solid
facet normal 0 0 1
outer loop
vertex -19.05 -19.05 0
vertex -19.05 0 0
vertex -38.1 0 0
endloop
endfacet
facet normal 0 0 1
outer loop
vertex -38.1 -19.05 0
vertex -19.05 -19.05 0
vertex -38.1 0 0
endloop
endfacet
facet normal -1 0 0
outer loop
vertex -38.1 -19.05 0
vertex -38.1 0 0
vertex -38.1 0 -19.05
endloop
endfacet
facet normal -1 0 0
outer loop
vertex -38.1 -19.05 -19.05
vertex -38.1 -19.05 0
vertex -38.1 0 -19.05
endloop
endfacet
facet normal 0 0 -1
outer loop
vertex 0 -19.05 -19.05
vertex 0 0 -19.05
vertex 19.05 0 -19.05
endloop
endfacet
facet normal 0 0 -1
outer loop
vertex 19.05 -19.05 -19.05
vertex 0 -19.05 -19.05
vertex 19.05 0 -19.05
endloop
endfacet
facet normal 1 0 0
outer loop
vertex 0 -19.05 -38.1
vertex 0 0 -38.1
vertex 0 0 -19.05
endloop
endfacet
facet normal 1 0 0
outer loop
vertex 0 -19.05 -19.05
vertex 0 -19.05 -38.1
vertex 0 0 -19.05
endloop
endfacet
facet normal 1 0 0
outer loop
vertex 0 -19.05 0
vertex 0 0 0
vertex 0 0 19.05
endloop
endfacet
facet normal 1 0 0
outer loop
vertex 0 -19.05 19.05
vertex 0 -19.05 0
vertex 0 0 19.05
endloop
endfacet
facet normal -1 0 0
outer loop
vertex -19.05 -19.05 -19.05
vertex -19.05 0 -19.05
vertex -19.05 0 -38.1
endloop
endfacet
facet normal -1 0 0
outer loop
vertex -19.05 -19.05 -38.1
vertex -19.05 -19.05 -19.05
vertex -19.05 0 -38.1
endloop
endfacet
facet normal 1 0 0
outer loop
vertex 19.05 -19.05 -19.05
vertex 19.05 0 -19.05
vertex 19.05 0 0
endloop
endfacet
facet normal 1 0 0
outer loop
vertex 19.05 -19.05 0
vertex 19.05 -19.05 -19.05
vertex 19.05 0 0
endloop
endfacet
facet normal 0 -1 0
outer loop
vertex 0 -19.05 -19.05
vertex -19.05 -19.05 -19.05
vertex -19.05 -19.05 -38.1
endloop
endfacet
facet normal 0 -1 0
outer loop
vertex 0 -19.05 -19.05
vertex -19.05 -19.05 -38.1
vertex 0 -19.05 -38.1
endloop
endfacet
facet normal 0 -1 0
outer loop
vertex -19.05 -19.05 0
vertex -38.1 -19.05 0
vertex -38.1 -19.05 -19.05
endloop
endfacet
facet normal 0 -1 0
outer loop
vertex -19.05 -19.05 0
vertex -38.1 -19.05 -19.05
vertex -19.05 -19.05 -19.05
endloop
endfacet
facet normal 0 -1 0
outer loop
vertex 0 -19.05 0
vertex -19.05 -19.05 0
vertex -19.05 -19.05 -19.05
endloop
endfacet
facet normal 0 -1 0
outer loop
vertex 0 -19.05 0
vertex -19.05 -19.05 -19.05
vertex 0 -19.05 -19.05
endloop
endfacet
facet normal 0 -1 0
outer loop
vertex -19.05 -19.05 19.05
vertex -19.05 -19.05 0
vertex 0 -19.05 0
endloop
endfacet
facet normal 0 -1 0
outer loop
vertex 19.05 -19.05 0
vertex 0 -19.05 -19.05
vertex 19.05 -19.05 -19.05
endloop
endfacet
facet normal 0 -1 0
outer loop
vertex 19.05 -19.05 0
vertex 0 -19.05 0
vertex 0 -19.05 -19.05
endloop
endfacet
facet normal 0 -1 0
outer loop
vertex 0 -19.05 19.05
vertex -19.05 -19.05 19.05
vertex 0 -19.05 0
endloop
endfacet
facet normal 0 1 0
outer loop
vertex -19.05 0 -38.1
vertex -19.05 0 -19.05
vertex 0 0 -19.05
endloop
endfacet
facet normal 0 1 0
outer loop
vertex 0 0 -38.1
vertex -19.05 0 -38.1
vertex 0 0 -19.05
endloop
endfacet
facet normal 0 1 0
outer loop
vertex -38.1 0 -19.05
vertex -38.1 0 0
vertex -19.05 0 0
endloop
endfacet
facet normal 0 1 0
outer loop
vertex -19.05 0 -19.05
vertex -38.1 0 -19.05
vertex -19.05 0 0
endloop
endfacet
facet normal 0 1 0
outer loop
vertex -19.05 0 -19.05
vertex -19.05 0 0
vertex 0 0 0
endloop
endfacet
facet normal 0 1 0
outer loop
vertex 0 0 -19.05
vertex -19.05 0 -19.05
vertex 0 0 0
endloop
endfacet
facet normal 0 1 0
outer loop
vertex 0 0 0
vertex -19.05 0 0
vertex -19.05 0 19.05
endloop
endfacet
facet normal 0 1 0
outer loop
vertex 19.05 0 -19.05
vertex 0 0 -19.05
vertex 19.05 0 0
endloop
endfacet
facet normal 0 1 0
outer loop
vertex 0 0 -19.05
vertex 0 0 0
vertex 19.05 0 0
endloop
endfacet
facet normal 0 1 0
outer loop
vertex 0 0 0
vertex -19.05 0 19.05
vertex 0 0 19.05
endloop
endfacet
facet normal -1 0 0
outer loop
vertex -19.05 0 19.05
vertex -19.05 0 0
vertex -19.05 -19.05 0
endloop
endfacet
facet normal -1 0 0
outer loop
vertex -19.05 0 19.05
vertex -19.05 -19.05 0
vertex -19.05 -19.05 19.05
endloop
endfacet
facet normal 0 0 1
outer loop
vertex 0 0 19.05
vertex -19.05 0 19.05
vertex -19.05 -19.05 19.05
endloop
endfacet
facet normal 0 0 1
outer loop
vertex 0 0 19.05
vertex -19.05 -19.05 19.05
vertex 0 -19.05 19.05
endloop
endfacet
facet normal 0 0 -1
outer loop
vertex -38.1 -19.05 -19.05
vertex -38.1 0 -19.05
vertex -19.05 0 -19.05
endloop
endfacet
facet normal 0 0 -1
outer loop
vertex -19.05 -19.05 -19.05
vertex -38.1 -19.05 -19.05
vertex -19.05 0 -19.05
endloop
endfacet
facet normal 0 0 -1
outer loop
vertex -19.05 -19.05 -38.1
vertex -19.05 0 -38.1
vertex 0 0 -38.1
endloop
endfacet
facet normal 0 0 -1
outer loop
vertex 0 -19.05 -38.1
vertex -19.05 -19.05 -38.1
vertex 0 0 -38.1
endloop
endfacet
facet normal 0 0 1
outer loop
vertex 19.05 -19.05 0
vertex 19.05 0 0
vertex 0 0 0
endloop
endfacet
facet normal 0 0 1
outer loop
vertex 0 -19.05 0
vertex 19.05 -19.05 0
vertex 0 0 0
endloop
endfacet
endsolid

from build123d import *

# Parameters (mm, degrees)
F0_W     = 19.05
F0_H     = 19.05
F1_DEPTH = 19.05


with BuildPart() as f1:
    # F0 (on Front) → F1 (new body)
    with BuildSketch(Plane.XZ):
        with Locations((-9.525, 9.525)):
            Rectangle(F0_W, F0_H)
        Polygon((0, 0), (-19.05, 0), (-38.1, 0), (-38.1, -19.05), (-19.05, -19.05), (-19.05, -38.1), (0, -38.1), (0, -19.05), (19.05, -19.05), (19.05, 0), align=None)
    extrude(amount=F1_DEPTH)


solid = f1.part
